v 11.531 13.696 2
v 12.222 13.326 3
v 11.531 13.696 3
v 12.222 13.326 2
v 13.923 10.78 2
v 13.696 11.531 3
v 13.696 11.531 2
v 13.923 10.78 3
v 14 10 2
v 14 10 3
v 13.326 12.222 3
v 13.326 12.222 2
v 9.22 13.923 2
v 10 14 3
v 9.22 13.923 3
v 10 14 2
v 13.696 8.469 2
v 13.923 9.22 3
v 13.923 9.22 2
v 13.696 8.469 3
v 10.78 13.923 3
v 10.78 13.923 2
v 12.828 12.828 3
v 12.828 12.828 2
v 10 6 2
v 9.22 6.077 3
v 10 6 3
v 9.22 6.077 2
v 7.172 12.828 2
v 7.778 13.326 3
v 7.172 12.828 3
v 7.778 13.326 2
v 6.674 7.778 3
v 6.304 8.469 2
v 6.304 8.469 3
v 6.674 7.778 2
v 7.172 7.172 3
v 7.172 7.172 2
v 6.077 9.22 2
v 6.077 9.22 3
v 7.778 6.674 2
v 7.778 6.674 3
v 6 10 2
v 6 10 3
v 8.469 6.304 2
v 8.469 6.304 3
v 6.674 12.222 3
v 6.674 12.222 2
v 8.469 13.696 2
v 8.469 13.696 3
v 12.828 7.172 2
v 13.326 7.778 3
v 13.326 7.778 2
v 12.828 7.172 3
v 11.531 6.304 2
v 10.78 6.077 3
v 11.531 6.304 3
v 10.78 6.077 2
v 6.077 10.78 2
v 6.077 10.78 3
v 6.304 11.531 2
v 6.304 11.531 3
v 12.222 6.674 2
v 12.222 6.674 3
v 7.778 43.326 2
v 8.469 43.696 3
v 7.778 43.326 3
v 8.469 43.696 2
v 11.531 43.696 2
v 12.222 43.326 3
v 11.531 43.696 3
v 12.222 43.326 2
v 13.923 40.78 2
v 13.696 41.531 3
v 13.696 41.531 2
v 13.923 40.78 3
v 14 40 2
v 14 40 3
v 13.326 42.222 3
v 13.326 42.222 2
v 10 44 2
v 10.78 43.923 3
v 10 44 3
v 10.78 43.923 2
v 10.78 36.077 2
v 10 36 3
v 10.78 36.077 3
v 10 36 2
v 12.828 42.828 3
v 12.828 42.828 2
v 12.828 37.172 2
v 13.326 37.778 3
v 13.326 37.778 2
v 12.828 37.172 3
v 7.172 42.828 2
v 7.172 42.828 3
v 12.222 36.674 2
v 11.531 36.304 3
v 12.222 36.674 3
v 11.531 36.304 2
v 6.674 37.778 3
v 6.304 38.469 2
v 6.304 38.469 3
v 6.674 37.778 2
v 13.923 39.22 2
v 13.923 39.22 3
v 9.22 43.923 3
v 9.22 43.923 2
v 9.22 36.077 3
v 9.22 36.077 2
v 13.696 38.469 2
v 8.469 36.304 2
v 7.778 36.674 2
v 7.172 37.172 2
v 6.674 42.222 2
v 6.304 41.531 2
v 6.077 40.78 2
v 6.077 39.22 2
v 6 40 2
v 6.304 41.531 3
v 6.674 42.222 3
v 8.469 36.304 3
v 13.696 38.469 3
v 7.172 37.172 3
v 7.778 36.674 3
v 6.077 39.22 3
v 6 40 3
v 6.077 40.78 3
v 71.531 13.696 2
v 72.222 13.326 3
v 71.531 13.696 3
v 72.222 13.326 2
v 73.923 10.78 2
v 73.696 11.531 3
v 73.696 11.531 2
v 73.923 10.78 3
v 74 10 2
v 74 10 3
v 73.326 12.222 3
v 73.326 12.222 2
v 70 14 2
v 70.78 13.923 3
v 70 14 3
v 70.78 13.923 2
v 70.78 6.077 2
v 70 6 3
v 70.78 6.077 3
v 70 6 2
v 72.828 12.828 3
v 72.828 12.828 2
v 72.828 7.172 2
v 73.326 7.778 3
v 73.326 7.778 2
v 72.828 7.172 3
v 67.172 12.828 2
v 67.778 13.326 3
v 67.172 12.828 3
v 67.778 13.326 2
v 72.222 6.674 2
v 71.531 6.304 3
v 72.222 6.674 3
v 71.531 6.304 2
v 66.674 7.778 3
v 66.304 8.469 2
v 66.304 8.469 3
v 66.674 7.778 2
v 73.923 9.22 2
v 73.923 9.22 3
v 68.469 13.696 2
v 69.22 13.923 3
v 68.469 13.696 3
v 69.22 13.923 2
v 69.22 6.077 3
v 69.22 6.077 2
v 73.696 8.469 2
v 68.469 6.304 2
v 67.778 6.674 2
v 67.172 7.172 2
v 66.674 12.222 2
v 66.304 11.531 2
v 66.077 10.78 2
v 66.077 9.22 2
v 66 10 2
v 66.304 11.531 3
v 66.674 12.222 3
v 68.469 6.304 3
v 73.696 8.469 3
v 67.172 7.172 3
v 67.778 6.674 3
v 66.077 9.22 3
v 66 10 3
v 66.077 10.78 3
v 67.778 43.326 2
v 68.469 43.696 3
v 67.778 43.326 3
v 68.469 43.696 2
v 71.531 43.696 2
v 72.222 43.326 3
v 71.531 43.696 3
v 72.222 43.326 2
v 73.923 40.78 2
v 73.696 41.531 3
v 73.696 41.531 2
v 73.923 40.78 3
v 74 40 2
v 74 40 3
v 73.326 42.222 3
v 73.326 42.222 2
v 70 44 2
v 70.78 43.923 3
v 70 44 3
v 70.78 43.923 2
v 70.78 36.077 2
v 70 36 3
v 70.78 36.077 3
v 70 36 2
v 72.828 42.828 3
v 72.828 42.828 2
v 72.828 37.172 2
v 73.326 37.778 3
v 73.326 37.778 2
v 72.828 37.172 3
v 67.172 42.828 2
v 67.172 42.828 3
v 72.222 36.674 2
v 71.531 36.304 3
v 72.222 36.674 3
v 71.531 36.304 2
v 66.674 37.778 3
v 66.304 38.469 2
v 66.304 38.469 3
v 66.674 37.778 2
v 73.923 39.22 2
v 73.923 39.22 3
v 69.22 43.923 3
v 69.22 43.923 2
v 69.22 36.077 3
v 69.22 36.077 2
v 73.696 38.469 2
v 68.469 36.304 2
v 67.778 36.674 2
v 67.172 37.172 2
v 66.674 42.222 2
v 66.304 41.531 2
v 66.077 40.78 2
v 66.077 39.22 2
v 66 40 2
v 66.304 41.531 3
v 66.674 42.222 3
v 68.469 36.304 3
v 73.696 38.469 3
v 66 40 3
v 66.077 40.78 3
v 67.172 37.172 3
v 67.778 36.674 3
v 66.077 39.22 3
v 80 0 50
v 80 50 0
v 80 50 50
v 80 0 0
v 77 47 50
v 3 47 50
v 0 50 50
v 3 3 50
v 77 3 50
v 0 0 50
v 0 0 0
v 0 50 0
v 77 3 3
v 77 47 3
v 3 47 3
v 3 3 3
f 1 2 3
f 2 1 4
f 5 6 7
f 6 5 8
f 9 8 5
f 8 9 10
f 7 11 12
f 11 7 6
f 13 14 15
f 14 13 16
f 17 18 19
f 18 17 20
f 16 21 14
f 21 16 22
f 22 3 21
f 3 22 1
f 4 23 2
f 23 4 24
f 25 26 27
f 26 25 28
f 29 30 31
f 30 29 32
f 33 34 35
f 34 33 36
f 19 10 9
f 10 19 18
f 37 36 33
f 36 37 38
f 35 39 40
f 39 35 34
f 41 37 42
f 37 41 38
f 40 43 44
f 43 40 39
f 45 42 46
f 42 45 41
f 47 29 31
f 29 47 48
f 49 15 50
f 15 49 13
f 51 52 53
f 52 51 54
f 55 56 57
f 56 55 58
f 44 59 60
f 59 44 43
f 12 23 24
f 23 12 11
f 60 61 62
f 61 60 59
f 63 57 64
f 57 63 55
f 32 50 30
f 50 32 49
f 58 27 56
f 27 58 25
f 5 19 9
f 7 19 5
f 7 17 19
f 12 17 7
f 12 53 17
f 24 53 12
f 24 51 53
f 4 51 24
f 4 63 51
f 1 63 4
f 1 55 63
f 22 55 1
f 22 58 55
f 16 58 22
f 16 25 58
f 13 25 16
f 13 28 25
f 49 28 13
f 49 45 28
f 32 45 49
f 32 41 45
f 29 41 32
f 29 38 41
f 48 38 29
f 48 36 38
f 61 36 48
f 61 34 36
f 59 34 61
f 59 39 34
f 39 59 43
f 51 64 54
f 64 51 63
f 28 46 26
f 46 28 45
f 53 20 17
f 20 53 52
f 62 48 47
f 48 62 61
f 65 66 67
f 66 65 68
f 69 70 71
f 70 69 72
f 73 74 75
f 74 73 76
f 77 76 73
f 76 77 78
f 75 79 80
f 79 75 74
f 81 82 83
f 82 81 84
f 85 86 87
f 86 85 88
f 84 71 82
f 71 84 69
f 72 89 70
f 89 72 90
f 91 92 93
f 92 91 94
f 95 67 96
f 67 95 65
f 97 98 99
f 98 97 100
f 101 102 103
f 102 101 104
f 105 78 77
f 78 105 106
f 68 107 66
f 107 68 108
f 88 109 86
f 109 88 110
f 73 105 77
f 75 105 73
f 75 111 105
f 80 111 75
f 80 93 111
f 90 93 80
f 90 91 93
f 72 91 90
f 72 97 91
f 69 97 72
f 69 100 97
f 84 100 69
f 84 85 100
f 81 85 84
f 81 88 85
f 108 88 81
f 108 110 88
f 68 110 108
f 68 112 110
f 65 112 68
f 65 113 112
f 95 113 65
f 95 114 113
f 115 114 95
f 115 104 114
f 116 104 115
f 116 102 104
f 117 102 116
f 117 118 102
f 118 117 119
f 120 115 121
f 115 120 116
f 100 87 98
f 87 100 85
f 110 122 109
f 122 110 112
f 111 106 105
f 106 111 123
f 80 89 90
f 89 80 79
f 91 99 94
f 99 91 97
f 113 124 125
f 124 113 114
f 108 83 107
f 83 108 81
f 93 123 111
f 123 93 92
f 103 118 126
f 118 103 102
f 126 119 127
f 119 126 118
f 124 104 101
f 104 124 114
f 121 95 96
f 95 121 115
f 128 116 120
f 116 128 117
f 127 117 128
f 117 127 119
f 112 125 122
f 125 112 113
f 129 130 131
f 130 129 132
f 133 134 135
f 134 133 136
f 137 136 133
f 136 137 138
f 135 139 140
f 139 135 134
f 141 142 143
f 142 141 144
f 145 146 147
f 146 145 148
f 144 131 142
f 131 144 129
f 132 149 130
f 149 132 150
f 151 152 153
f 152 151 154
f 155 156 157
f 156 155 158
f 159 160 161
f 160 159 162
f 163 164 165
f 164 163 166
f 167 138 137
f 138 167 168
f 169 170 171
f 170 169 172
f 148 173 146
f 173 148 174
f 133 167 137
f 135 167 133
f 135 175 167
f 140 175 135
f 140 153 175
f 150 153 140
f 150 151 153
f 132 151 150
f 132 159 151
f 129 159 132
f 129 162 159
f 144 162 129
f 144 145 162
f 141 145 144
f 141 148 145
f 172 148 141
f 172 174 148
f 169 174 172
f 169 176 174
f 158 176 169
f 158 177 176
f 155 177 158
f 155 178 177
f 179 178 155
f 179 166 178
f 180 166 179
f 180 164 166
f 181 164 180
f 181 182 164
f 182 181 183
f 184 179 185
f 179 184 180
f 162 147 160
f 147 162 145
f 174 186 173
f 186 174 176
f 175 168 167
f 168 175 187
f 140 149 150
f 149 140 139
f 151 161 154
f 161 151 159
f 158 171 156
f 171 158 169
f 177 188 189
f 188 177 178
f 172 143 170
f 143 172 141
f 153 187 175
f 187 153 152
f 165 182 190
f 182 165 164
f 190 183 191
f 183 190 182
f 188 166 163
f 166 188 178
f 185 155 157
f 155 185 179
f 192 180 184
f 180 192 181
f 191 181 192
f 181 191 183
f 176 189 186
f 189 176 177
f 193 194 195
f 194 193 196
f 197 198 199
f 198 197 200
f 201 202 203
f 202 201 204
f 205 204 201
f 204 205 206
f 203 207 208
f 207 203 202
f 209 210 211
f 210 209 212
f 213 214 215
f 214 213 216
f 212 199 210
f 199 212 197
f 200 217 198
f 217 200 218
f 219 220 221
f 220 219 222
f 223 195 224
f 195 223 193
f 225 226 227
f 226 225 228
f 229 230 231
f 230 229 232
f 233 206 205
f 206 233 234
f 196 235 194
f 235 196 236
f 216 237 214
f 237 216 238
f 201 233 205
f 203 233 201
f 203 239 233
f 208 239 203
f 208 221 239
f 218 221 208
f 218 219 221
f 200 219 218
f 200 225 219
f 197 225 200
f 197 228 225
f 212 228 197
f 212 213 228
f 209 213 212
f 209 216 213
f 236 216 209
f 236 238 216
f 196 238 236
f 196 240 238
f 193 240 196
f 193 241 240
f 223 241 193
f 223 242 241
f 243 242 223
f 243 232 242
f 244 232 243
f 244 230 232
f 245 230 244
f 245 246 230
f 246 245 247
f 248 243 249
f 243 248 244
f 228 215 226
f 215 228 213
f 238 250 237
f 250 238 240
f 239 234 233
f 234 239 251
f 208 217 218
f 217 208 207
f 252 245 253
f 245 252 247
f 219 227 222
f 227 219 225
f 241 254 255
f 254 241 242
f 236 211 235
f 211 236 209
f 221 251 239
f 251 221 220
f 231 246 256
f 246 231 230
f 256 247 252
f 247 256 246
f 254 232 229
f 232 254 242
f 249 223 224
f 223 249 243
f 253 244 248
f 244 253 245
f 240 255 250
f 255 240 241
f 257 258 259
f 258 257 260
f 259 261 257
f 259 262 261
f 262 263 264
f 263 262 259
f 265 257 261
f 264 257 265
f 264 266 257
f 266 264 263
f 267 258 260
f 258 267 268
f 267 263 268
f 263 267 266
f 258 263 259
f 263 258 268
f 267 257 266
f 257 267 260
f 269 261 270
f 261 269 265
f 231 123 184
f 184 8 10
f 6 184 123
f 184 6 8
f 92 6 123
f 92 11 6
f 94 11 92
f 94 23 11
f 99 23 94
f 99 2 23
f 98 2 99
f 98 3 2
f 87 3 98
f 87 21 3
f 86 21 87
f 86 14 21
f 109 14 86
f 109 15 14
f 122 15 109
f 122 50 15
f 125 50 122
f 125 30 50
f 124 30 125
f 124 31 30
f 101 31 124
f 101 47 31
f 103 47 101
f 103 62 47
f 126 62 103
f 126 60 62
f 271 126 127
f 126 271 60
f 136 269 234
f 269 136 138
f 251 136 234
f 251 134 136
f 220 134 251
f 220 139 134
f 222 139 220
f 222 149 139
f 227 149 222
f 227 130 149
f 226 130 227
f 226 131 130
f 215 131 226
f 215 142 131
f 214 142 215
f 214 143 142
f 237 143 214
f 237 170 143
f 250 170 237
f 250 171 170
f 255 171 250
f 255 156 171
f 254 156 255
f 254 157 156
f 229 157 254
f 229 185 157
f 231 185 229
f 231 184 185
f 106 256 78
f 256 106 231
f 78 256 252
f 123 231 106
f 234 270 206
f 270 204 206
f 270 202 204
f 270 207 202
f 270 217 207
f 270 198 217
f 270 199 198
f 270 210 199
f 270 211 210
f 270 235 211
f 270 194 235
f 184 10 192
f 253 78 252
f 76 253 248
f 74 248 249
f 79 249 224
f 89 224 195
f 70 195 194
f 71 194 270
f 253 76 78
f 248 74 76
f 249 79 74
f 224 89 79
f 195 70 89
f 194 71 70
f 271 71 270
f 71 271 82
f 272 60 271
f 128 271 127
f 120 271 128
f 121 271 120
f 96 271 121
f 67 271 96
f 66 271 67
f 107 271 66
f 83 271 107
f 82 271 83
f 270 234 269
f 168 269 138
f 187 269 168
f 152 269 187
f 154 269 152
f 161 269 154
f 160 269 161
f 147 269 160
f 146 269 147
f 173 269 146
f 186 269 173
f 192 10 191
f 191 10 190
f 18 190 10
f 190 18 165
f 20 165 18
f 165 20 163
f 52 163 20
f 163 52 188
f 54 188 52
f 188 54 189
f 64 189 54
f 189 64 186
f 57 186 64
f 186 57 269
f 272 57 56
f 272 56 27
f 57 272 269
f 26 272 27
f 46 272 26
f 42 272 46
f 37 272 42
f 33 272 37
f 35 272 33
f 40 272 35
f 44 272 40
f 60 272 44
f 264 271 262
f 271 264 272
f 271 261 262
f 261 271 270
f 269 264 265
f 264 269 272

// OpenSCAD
$fn = 32;

// ----------------------------------------------------------------------
// Enclosure box: bosses enclosure
// ----------------------------------------------------------------------

// --- parameters (mm) ---
box_l = 80;               // outer length, X
box_w = 50;               // outer width, Y
box_h = 50;               // outer height
wall_t = 3;               // wall thickness
boss_r = 4;               // corner boss radius
hole_r = 1.5;             // boss screw hole radius
boss_in = 10;             // boss inset from the corners

inner_h = box_h - wall_t;  // cavity depth
boss_h = inner_h - 2;  // corner boss height

difference() {
  cube([box_l, box_w, box_h]);
  translate([wall_t, wall_t, wall_t])
    cube([box_l - 2 * wall_t, box_w - 2 * wall_t, box_h]);
  for (sx = [0, 1], sy = [0, 1])
    translate([sx ? box_l - boss_in : boss_in,
               sy ? box_w - boss_in : boss_in, wall_t - 1]) {
      cylinder(r = boss_r, h = boss_h);
      translate([0, 0, boss_h - 4])
        cylinder(r = hole_r, h = 5);
    }
}
